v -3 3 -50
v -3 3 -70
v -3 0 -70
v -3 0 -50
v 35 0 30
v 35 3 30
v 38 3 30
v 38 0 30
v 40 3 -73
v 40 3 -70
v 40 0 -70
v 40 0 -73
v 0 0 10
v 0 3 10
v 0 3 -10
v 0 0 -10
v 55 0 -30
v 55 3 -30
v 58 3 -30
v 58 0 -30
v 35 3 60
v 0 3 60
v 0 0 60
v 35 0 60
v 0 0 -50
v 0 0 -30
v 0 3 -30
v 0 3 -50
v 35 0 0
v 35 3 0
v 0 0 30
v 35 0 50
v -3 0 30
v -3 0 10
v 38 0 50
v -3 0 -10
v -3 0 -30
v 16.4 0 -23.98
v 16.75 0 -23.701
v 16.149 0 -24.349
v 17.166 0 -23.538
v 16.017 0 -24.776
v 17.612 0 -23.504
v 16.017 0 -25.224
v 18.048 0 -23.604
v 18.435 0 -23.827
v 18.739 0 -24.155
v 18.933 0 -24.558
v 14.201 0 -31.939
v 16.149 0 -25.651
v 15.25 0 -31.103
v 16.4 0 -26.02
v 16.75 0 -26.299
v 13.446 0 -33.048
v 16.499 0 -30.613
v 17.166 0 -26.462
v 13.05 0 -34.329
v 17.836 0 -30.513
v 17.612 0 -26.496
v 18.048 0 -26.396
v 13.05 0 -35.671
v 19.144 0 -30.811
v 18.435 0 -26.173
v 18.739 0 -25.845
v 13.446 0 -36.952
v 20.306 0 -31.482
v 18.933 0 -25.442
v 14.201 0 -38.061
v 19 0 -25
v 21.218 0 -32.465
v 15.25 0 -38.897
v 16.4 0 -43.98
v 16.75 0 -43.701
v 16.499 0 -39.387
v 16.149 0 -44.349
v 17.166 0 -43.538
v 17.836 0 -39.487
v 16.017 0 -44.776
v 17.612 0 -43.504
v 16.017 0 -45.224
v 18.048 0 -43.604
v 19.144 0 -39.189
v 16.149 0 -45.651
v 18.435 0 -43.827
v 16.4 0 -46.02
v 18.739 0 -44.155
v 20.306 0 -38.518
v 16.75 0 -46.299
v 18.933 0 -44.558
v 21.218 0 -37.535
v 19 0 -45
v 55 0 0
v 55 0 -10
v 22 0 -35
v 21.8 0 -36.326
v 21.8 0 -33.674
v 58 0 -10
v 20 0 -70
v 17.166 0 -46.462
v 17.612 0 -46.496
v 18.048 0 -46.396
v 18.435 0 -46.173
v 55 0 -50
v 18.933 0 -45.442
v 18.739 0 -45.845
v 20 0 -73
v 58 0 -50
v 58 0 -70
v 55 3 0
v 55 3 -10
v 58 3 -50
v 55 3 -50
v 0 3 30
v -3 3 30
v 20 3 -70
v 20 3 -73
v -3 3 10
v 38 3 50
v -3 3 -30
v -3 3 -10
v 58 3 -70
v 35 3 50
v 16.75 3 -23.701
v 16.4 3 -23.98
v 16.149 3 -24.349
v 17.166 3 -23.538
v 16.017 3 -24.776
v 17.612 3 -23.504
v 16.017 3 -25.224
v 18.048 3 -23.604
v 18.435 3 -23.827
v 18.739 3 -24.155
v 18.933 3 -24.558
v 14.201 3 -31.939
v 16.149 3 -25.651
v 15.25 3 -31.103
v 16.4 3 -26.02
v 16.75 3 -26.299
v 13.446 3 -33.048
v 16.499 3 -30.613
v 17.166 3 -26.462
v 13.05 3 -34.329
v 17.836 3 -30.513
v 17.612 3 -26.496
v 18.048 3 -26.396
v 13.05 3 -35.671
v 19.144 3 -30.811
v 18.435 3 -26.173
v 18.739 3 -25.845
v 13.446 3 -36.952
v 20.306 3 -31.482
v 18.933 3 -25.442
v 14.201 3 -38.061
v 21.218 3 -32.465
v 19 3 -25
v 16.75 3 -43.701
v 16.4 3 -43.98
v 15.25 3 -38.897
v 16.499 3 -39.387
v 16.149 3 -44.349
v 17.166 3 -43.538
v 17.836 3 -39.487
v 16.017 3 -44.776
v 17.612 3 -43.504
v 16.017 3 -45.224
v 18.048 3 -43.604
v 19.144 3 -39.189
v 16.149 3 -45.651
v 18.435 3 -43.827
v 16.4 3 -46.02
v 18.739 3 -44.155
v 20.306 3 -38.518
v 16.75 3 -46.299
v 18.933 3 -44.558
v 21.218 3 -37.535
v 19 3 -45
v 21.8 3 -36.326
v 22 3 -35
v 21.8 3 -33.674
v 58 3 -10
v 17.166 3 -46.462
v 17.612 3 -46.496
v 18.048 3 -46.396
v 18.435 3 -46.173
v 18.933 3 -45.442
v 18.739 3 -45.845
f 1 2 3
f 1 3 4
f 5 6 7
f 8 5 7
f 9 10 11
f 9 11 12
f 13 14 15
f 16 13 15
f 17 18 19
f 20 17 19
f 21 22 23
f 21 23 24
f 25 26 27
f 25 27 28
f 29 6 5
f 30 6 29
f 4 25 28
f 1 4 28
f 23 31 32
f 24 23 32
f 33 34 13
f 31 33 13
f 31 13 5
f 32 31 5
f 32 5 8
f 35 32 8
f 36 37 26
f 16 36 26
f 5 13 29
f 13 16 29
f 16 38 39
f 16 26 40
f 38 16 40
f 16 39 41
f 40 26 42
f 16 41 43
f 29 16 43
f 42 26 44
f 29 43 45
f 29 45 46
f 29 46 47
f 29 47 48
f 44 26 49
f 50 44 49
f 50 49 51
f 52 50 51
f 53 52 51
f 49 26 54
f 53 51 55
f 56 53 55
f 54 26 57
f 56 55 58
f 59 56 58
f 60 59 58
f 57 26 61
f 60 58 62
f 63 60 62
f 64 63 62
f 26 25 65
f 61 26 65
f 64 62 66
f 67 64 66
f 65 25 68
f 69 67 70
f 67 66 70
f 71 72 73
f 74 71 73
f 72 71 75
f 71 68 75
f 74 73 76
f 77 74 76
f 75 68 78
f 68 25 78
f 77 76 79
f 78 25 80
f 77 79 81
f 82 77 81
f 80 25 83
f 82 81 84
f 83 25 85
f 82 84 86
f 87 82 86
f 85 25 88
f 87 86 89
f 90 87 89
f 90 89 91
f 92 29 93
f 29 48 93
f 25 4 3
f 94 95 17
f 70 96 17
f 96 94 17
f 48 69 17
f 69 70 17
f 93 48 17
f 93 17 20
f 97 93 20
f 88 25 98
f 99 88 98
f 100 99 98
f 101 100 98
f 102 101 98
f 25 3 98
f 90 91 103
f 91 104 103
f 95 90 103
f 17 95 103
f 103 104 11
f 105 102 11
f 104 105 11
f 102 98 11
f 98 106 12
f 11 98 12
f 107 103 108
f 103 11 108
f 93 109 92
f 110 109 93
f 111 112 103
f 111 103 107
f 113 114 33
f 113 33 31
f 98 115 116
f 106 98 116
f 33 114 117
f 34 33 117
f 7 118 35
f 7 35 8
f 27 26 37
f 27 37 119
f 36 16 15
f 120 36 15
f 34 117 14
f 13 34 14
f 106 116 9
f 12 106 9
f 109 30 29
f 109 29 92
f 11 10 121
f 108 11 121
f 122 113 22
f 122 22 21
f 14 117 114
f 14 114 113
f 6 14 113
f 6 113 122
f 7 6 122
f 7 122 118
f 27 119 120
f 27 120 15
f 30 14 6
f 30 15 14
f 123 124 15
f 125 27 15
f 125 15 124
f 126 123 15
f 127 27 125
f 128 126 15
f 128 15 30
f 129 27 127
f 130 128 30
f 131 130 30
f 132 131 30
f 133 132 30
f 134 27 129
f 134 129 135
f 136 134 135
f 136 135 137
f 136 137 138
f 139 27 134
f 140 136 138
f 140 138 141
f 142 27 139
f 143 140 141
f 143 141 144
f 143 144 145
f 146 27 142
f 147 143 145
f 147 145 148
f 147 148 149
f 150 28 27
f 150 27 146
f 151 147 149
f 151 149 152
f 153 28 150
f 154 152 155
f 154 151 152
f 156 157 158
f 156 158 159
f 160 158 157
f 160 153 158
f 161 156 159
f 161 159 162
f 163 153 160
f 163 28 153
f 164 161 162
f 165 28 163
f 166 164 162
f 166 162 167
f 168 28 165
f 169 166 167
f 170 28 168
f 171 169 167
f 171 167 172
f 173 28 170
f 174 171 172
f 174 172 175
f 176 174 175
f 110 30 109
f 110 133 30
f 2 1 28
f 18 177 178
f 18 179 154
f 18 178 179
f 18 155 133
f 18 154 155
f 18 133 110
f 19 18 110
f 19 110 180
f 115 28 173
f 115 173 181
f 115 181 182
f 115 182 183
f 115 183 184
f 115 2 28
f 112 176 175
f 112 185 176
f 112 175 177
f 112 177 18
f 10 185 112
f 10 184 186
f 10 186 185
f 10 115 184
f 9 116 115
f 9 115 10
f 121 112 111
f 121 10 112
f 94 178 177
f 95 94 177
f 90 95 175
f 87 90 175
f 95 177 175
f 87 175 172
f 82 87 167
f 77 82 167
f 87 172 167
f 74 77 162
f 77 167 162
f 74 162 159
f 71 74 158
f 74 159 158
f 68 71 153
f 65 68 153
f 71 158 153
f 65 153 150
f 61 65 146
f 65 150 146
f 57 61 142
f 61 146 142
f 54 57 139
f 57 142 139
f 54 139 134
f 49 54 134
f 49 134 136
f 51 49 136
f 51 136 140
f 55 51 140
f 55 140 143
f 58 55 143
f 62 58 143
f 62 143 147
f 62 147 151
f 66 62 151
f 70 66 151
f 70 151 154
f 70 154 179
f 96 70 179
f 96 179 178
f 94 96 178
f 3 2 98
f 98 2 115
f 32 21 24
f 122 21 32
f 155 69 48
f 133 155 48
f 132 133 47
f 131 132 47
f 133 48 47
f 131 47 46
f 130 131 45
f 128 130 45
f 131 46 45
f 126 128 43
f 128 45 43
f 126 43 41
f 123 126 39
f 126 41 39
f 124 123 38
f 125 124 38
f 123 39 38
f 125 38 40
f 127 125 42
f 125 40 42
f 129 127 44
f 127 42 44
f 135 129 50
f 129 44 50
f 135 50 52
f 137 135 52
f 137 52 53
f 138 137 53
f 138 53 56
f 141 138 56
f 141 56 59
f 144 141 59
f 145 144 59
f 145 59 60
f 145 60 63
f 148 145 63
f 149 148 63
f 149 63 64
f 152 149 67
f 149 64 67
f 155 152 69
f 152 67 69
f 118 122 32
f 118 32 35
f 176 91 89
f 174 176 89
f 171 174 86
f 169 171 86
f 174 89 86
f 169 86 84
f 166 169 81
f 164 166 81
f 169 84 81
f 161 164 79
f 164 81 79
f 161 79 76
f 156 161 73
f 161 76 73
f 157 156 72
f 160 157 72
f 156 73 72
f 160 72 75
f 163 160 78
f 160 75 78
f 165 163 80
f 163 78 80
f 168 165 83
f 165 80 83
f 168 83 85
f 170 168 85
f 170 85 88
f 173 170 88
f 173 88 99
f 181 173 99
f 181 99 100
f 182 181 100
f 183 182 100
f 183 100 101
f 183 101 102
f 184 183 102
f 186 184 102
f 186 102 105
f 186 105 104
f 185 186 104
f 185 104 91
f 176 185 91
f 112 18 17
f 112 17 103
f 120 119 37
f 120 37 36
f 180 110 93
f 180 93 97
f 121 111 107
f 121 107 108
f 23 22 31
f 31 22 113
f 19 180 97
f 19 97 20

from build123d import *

# Parameters (mm, degrees)
SKETCH1_W            = 35
SKETCH1_H            = 70
BOSS_EXTRUDE1_DEPTH  = 3
SKETCH2_W            = 20
SKETCH2_H            = 3
BOSS_EXTRUDE2_DEPTH  = 3
SKETCH3_W            = 20
SKETCH3_H            = 3
BOSS_EXTRUDE3_DEPTH  = 3
SKETCH6_R            = 4.5
CUT_EXTRUDE1_DEPTH   = 10
SKETCH7_R            = 1.5
CUT_EXTRUDE2_DEPTH   = 3
SKETCH8_R            = 1.5
CUT_EXTRUDE3_DEPTH   = 10
SKETCH11_W           = 35
SKETCH11_H           = 60
BOSS_EXTRUDE7_DEPTH  = 3
SKETCH14_W           = 20
SKETCH14_H           = 70
BOSS_EXTRUDE9_DEPTH  = 3
SKETCH15_W           = 3
SKETCH15_H           = 20
BOSS_EXTRUDE10_DEPTH = 3
SKETCH16_W           = 20
SKETCH16_H           = 3
BOSS_EXTRUDE11_DEPTH = 3
SKETCH17_W           = 3
SKETCH17_H           = 20
BOSS_EXTRUDE12_DEPTH = 3


with BuildPart() as part:
    # Sketch1 → Boss-Extrude1 (new body)
    with BuildSketch(Plane(origin=(0, 0, 0), x_dir=(1, 0, 0), z_dir=(0, 1, 0))):
        with Locations((17.5, 35)):
            Rectangle(SKETCH1_W, SKETCH1_H)
    extrude(amount=BOSS_EXTRUDE1_DEPTH)

    # Sketch2 → Boss-Extrude2 (add)
    with BuildSketch(Plane.ZY):
        with Locations((-60, 1.5)):
            Rectangle(SKETCH2_W, SKETCH2_H)
    extrude(amount=BOSS_EXTRUDE2_DEPTH)

    # Sketch3 → Boss-Extrude3 (add)
    with BuildSketch(Plane.ZY):
        with Locations((-20, 1.5)):
            Rectangle(SKETCH3_W, SKETCH3_H)
    extrude(amount=BOSS_EXTRUDE3_DEPTH)

    # Sketch6 → Cut-Extrude1 (cut)
    with BuildSketch(Plane(origin=(0, 3, 0), x_dir=(1, 0, 0), z_dir=(0, 1, 0))):
        with Locations((17.5, 35)):
            Circle(SKETCH6_R)
    extrude(amount=-CUT_EXTRUDE1_DEPTH, mode=Mode.SUBTRACT)

    # Sketch7 → Cut-Extrude2 (cut)
    with BuildSketch(Plane.XZ):
        with Locations((17.5, -25)):
            Circle(SKETCH7_R)
    extrude(amount=-CUT_EXTRUDE2_DEPTH, mode=Mode.SUBTRACT)

    # Sketch8 → Cut-Extrude3 (cut)
    with BuildSketch(Plane.XZ):
        with Locations((17.5, -45)):
            Circle(SKETCH8_R)
    extrude(amount=-CUT_EXTRUDE3_DEPTH, mode=Mode.SUBTRACT)

    # Sketch11 → Boss-Extrude7 (add)
    with BuildSketch(Plane(origin=(0, 3, 0), x_dir=(1, 0, 0), z_dir=(0, 1, 0))):
        with Locations((17.5, -30)):
            Rectangle(SKETCH11_W, SKETCH11_H)
    extrude(amount=-BOSS_EXTRUDE7_DEPTH)

    # Sketch14 → Boss-Extrude9 (add)
    with BuildSketch(Plane(origin=(0, 3, 0), x_dir=(1, 0, 0), z_dir=(0, 1, 0))):
        with Locations((45, 35)):
            Rectangle(SKETCH14_W, SKETCH14_H)
    extrude(amount=-BOSS_EXTRUDE9_DEPTH)

    # Sketch15 → Boss-Extrude10 (add)
    with BuildSketch(Plane(origin=(0, 3, 0), x_dir=(1, 0, 0), z_dir=(0, 1, 0))):
        with Locations((56.5, 60)):
            Rectangle(SKETCH15_W, SKETCH15_H)
        with Locations((56.5, 20)):
            Rectangle(SKETCH15_W, SKETCH15_H)
    extrude(amount=-BOSS_EXTRUDE10_DEPTH)

    # Sketch16 → Boss-Extrude11 (add)
    with BuildSketch(Plane(origin=(0, 3, 0), x_dir=(1, 0, 0), z_dir=(0, 1, 0))):
        with Locations((30, 71.5)):
            Rectangle(SKETCH16_W, SKETCH16_H)
    extrude(amount=-BOSS_EXTRUDE11_DEPTH)

    # Sketch17 → Boss-Extrude12 (add)
    with BuildSketch(Plane(origin=(0, 3, 0), x_dir=(1, 0, 0), z_dir=(0, 1, 0))):
        with Locations((36.5, -40)):
            Rectangle(SKETCH17_W, SKETCH17_H)
        with Locations((-1.5, -20)):
            Rectangle(SKETCH17_W, SKETCH17_H)
    extrude(amount=-BOSS_EXTRUDE12_DEPTH)


solid = part.part
